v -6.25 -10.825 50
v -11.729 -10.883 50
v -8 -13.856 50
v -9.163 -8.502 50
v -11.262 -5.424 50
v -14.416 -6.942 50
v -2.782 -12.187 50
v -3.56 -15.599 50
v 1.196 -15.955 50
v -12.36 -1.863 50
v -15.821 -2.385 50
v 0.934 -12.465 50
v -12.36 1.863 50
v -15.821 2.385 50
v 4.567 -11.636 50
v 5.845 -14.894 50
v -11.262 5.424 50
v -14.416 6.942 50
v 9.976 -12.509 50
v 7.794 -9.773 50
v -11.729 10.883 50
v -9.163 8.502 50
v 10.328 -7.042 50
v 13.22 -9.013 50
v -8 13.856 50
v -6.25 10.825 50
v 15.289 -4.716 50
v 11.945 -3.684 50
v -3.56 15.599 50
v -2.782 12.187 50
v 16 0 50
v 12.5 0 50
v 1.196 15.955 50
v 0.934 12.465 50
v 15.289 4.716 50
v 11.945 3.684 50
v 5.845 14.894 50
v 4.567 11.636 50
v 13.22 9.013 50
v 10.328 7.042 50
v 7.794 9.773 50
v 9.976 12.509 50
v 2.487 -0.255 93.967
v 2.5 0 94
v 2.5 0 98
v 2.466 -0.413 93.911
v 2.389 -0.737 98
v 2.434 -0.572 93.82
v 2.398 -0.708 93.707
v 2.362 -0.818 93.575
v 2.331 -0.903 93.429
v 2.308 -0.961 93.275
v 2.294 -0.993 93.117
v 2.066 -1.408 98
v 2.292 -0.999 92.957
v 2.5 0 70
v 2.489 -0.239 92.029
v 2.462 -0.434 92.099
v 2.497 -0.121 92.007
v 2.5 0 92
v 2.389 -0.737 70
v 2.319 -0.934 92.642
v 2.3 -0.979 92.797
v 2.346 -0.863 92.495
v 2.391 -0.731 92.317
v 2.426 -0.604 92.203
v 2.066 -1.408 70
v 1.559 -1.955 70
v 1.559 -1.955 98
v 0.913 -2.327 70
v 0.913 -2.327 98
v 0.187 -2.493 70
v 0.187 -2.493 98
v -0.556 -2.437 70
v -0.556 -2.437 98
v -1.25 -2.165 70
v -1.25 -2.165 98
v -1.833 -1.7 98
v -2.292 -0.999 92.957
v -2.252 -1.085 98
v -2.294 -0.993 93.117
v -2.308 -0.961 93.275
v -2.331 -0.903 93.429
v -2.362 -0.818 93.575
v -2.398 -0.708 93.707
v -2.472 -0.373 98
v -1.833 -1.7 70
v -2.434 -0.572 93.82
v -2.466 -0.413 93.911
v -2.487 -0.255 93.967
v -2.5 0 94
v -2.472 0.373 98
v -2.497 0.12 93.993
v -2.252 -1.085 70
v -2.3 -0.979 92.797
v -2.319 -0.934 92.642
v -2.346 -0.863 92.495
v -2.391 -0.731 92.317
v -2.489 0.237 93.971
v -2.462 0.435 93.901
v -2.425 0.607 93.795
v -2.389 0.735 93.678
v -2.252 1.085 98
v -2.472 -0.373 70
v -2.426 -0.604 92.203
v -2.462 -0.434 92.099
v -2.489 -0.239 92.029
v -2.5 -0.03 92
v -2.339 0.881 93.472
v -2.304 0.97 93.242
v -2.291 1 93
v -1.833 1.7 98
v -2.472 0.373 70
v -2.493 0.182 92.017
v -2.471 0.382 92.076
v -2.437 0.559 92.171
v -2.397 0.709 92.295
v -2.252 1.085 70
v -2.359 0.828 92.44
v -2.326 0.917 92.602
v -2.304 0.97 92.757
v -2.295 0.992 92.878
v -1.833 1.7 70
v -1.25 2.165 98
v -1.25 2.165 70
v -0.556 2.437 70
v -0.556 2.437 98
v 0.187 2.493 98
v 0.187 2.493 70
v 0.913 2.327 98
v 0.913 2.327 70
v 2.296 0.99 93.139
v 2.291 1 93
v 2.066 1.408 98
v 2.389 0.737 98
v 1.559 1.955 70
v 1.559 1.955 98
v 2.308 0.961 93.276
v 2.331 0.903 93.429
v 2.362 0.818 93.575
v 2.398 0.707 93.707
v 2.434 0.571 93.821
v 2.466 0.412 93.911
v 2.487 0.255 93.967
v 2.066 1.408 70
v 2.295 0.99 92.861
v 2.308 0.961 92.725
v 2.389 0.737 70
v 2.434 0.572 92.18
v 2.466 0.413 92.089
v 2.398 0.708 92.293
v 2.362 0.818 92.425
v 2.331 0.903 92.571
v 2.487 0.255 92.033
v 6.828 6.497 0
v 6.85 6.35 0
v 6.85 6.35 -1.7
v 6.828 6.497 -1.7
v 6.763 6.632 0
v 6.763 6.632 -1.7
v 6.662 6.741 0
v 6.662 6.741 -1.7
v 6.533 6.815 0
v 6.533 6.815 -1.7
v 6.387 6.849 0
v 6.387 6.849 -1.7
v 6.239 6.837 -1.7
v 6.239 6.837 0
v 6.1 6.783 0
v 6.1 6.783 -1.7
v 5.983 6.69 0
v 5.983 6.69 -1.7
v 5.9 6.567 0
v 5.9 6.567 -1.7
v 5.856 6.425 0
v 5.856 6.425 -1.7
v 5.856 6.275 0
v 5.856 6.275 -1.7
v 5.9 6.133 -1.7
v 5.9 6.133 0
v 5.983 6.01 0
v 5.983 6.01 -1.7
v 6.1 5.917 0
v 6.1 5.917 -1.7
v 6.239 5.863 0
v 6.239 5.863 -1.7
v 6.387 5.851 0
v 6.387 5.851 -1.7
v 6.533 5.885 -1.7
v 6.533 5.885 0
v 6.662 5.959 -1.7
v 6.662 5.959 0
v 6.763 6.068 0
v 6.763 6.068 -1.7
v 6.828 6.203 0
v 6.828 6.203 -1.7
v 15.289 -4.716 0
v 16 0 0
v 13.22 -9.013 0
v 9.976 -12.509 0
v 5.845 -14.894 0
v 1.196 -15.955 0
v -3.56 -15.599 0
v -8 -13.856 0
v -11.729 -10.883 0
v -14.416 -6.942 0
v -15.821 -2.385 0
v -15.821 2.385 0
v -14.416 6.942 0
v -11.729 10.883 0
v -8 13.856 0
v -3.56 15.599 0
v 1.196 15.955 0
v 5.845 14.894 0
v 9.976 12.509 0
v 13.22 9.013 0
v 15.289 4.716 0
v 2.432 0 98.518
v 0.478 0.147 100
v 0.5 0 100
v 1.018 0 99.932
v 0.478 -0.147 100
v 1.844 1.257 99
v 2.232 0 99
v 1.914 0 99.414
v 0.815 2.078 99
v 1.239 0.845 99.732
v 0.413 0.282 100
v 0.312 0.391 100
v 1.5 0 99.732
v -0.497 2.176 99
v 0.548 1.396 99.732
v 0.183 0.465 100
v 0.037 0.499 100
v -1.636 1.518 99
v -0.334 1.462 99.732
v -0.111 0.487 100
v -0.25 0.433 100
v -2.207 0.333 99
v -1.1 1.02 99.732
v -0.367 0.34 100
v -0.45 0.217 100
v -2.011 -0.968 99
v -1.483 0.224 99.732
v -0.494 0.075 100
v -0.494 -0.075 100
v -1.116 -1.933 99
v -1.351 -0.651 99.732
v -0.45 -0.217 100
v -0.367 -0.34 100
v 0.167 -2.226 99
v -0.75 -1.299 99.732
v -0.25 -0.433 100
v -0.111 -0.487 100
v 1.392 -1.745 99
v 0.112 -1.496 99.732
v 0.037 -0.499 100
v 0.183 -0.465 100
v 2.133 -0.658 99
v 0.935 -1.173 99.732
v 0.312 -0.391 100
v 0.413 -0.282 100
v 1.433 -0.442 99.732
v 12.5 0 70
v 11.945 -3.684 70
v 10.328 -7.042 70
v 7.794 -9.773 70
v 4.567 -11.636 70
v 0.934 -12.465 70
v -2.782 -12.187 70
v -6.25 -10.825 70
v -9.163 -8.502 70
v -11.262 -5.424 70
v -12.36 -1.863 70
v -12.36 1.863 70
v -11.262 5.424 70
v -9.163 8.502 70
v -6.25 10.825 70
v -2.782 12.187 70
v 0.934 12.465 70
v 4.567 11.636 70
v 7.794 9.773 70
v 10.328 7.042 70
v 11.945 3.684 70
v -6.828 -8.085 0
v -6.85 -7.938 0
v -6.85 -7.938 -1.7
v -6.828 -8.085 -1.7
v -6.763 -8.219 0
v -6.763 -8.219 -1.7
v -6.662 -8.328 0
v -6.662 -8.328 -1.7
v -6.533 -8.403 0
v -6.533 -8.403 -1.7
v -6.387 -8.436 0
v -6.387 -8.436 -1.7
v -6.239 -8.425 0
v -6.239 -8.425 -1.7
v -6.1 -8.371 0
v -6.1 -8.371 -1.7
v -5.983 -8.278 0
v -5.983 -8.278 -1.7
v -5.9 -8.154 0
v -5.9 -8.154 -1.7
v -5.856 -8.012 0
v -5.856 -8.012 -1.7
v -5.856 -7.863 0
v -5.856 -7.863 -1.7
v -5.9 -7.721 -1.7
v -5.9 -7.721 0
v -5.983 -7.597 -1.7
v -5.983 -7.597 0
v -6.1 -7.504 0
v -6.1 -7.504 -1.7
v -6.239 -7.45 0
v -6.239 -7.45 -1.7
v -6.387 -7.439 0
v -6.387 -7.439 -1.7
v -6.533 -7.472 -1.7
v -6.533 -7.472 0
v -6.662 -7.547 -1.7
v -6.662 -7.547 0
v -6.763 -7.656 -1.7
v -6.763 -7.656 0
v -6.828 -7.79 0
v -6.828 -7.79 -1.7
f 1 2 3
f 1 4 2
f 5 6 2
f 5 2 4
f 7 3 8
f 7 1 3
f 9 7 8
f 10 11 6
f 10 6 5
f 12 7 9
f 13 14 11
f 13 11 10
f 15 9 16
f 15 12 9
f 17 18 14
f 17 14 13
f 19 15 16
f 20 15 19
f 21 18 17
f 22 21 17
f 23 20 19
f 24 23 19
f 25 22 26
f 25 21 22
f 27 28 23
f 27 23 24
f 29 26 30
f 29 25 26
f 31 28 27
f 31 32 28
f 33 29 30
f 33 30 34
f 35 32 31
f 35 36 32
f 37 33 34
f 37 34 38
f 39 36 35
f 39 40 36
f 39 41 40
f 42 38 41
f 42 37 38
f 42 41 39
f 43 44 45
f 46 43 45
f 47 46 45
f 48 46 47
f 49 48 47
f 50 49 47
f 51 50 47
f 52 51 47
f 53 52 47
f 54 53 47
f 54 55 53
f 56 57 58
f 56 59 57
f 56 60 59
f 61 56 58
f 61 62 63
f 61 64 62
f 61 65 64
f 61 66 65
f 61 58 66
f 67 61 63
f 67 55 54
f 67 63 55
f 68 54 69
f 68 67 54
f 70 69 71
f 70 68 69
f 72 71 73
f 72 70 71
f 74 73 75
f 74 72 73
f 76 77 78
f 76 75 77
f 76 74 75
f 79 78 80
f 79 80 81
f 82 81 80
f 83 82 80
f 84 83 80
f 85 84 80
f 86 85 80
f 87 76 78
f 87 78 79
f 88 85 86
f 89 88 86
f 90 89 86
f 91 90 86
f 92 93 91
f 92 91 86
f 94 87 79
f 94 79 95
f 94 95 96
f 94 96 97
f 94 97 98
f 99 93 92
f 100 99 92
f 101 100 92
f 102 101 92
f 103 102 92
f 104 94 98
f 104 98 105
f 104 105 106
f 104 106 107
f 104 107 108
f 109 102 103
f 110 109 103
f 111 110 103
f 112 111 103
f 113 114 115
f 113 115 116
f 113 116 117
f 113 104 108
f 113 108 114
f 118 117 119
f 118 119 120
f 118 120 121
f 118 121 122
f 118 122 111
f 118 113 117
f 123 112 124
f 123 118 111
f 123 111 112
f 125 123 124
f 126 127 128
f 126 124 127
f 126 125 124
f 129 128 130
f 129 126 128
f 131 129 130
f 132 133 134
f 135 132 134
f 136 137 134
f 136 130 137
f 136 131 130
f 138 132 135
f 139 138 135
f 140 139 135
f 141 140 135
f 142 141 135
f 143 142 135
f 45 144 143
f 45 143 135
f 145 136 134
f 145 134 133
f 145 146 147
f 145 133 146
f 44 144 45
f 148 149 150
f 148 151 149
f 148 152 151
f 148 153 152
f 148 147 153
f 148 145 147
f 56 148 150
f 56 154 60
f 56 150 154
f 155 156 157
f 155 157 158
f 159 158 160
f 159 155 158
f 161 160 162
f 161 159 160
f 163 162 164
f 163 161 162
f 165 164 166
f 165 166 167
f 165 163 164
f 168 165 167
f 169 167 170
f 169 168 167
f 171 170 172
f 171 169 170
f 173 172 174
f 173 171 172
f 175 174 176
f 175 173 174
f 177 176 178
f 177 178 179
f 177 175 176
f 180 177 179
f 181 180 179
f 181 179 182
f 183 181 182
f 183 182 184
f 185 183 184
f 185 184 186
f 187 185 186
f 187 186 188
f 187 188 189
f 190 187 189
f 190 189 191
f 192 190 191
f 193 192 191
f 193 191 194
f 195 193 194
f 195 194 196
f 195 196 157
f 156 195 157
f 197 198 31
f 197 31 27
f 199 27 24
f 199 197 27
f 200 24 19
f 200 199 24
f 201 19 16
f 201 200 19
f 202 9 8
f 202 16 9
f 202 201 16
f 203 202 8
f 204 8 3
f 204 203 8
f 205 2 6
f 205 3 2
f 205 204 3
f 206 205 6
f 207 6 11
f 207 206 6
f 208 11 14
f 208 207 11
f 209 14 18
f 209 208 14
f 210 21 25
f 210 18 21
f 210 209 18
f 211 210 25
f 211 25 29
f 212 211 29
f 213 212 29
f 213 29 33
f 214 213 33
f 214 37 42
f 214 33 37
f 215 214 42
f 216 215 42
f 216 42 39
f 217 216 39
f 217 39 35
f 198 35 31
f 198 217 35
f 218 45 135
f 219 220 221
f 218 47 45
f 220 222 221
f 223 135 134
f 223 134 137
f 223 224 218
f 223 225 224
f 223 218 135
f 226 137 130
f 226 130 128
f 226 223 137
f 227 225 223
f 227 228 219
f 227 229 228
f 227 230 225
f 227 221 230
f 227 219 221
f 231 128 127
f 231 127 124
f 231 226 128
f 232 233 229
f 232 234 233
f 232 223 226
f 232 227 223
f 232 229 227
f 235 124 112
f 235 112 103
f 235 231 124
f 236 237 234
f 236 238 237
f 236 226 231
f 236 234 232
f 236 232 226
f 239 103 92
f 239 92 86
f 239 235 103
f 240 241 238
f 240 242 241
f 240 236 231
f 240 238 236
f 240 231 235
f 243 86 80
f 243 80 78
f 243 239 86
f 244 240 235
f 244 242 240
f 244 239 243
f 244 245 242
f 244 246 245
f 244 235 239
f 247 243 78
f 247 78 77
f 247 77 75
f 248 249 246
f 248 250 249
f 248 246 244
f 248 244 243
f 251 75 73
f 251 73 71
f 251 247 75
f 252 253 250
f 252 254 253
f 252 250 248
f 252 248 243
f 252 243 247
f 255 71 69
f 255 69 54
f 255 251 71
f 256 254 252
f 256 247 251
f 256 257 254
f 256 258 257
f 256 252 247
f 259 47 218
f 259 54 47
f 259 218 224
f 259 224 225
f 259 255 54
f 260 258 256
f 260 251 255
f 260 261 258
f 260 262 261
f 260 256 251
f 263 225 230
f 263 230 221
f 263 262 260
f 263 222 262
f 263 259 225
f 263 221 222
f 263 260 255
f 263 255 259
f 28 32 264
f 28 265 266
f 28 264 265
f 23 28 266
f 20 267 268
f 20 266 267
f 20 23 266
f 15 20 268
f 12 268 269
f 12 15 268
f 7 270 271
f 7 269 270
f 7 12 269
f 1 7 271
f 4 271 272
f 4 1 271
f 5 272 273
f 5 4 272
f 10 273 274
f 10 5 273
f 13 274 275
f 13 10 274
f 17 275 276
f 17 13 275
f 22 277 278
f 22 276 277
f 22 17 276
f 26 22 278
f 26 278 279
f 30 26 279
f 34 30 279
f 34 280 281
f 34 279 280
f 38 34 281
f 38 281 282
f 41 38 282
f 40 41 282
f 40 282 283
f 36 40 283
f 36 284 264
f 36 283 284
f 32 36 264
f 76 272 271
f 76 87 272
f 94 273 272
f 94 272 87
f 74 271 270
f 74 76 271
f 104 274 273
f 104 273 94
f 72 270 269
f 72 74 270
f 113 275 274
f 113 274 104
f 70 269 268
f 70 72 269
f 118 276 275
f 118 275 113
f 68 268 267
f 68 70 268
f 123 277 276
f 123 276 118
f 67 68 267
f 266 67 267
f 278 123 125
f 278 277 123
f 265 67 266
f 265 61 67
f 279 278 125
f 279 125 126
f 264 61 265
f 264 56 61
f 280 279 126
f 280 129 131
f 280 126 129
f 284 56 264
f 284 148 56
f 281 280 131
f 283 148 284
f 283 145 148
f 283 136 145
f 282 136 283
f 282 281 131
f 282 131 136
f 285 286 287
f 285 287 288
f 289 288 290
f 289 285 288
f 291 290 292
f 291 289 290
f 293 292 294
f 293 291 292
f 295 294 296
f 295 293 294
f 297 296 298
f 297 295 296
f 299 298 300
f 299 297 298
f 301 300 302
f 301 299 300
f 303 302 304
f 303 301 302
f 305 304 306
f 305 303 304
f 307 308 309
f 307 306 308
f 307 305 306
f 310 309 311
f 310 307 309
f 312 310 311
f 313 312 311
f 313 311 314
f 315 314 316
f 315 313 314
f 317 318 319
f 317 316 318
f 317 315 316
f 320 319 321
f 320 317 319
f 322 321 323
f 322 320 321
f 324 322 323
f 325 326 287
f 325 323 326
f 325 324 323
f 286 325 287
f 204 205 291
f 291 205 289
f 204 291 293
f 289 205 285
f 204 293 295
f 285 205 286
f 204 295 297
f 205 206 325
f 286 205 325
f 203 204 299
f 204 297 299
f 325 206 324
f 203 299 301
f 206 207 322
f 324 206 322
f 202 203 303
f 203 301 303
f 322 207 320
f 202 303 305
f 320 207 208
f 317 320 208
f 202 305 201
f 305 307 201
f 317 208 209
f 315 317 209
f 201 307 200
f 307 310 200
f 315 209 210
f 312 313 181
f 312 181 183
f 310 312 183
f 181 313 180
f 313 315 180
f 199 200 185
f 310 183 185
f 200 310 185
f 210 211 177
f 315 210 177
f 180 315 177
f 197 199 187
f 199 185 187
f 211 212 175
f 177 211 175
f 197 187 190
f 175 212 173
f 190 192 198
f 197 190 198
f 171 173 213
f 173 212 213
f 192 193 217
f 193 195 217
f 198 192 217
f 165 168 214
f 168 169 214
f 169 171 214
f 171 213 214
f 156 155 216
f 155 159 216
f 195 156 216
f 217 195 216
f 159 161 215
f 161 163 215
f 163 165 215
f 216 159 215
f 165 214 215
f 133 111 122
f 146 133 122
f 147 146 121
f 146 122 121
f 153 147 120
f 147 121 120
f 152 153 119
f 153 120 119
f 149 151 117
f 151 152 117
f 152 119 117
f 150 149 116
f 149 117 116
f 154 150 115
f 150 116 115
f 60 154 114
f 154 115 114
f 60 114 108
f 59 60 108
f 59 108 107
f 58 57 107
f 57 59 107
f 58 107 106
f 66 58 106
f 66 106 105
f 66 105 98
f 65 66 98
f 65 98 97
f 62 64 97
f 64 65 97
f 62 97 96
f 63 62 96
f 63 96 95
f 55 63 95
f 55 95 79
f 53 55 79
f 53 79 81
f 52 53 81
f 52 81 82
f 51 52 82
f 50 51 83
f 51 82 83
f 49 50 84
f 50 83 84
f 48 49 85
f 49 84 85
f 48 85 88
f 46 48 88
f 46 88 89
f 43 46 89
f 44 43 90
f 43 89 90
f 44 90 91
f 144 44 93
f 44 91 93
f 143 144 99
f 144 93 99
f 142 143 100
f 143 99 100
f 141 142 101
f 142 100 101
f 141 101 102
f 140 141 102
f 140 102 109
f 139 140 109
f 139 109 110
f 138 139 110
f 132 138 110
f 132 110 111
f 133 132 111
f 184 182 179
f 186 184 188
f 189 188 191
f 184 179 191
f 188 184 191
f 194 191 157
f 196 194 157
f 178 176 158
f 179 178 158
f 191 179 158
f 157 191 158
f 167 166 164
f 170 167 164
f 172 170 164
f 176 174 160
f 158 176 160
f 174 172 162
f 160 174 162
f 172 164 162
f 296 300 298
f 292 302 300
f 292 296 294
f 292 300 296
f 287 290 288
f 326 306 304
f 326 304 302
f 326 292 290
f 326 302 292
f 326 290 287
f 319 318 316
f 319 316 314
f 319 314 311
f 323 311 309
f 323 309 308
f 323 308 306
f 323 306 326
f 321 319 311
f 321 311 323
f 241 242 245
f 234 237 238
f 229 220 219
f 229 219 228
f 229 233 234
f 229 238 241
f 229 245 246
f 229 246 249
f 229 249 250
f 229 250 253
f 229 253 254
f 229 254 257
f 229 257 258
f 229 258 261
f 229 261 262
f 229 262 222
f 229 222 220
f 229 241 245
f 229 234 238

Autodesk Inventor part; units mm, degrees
ref_plane "YZ Plane" through (0, 0, 0) normal (1, 0, 0) x (0, 1, 0)
ref_plane "XZ Plane" through (0, 0, 0) normal (0, 1, 0) x (-1, 0, 0)
ref_plane "XY Plane" through (0, 0, 0) normal (0, 0, 1) x (1, 0, 0)
sketch "Sketch1" plane through (0, 0, 0) normal (0, 0, 1) x (1, 0, 0)
  circle A0 centre (0, 0) radius 16
  dimension "d0" = 32
extrude "Extrusion1" add sketch "Sketch1" along normal blind 50
sketch "Sketch2" plane through (0, 0, 50) normal (0, 0, 1) x (1, 0, 0)
  circle A0 centre (0, 0) radius 12.5
  dimension "d3" = 25
extrude "Extrusion2" add sketch "Sketch2" along normal blind 20
thread "Thread1" size "M25x2" class "6g" standard "ANSI Metric M Profile" full length
sketch "Sketch3" plane through (0, 0, 70) normal (0, 0, 1) x (1, 0, 0)
  circle A0 centre (0, 0) radius 2.5
  dimension "d8" = 5
extrude "Extrusion3" add sketch "Sketch3" along normal blind 30
sketch "Sketch4" plane through (0, 0, 0) normal (1, 0, 0) x (0, 1, 0)
  line L0 (2.5, 100) -> (-2.5, 100) projected
  line L1 (0, 100) -> (0, 93)
  circle A0 centre (0, 93) radius 1
  point P0 (0, 0)
  dimension "d11" = 7
  dimension "d12" = 2
extrude "Extrusion4" cut sketch "Sketch4" along normal through all both and the other way through all
fillet "Fillet1" radius 2 1 edges at (-2.5, 0, 100)
sketch "Sketch5" plane through (0, 0, 0) normal (0, 0, 1) x (1, 0, 0)
  circle A0 centre (6.35, 6.35) radius 0.5
  circle A1 centre (-7.9375, -6.35) radius 0.5
  point P0 (0, 0)
  dimension "d16" = 1
  dimension "d17" = 1
extrude "Extrusion5" add sketch "Sketch5" against normal blind 1.7 contours A0
sketch "Sketch6" plane through (0, 0, 0) normal (0, 0, -1) x (-1, 0, 0)
  circle A0 centre (6.35, -7.9375) radius 0.5
  point P0 (0, 0)
  dimension "d20" = 1
extrude "Extrusion6" add sketch "Sketch6" along normal blind 1.7
sketch "Sketch7" plane through (0, 0, 0) normal (0, 0, -1) x (-1, 0, 0)
  circle A0 centre (-6.35, 6.35) radius 0.5 projected
  line L0 (-6.35, 6.35) -> (-42.8625, 12.7) construction
  line L1 (-42.8625, 12.7) -> (-28.575, -14.2875) construction
  line L2 (-28.575, -14.2875) -> (-46.0375, -6.35) construction
  line L3 (-46.0375, -6.35) -> (-31.75, -22.225) construction
  spline S0 degree 4 poles (-6.35, 6.35) (-42.8625, 12.7) (-28.575, -14.2875) (-46.0375, -6.35) (-31.75, -22.225) knots 1 1 1 1 1 2 2 2 2 2
  line L4 (6.35, -7.9375) -> (-22.6919, -25.4) construction
  line L5 (-22.6919, -25.4) -> (-14.2875, -33.3375) construction
  spline S1 degree 2 poles (6.35, -7.9375) (-22.6919, -25.4) (-14.2875, -33.3375) knots 1 1 1 2 2 2
  point P0 (0, 0)
properties part number "dc motor"
